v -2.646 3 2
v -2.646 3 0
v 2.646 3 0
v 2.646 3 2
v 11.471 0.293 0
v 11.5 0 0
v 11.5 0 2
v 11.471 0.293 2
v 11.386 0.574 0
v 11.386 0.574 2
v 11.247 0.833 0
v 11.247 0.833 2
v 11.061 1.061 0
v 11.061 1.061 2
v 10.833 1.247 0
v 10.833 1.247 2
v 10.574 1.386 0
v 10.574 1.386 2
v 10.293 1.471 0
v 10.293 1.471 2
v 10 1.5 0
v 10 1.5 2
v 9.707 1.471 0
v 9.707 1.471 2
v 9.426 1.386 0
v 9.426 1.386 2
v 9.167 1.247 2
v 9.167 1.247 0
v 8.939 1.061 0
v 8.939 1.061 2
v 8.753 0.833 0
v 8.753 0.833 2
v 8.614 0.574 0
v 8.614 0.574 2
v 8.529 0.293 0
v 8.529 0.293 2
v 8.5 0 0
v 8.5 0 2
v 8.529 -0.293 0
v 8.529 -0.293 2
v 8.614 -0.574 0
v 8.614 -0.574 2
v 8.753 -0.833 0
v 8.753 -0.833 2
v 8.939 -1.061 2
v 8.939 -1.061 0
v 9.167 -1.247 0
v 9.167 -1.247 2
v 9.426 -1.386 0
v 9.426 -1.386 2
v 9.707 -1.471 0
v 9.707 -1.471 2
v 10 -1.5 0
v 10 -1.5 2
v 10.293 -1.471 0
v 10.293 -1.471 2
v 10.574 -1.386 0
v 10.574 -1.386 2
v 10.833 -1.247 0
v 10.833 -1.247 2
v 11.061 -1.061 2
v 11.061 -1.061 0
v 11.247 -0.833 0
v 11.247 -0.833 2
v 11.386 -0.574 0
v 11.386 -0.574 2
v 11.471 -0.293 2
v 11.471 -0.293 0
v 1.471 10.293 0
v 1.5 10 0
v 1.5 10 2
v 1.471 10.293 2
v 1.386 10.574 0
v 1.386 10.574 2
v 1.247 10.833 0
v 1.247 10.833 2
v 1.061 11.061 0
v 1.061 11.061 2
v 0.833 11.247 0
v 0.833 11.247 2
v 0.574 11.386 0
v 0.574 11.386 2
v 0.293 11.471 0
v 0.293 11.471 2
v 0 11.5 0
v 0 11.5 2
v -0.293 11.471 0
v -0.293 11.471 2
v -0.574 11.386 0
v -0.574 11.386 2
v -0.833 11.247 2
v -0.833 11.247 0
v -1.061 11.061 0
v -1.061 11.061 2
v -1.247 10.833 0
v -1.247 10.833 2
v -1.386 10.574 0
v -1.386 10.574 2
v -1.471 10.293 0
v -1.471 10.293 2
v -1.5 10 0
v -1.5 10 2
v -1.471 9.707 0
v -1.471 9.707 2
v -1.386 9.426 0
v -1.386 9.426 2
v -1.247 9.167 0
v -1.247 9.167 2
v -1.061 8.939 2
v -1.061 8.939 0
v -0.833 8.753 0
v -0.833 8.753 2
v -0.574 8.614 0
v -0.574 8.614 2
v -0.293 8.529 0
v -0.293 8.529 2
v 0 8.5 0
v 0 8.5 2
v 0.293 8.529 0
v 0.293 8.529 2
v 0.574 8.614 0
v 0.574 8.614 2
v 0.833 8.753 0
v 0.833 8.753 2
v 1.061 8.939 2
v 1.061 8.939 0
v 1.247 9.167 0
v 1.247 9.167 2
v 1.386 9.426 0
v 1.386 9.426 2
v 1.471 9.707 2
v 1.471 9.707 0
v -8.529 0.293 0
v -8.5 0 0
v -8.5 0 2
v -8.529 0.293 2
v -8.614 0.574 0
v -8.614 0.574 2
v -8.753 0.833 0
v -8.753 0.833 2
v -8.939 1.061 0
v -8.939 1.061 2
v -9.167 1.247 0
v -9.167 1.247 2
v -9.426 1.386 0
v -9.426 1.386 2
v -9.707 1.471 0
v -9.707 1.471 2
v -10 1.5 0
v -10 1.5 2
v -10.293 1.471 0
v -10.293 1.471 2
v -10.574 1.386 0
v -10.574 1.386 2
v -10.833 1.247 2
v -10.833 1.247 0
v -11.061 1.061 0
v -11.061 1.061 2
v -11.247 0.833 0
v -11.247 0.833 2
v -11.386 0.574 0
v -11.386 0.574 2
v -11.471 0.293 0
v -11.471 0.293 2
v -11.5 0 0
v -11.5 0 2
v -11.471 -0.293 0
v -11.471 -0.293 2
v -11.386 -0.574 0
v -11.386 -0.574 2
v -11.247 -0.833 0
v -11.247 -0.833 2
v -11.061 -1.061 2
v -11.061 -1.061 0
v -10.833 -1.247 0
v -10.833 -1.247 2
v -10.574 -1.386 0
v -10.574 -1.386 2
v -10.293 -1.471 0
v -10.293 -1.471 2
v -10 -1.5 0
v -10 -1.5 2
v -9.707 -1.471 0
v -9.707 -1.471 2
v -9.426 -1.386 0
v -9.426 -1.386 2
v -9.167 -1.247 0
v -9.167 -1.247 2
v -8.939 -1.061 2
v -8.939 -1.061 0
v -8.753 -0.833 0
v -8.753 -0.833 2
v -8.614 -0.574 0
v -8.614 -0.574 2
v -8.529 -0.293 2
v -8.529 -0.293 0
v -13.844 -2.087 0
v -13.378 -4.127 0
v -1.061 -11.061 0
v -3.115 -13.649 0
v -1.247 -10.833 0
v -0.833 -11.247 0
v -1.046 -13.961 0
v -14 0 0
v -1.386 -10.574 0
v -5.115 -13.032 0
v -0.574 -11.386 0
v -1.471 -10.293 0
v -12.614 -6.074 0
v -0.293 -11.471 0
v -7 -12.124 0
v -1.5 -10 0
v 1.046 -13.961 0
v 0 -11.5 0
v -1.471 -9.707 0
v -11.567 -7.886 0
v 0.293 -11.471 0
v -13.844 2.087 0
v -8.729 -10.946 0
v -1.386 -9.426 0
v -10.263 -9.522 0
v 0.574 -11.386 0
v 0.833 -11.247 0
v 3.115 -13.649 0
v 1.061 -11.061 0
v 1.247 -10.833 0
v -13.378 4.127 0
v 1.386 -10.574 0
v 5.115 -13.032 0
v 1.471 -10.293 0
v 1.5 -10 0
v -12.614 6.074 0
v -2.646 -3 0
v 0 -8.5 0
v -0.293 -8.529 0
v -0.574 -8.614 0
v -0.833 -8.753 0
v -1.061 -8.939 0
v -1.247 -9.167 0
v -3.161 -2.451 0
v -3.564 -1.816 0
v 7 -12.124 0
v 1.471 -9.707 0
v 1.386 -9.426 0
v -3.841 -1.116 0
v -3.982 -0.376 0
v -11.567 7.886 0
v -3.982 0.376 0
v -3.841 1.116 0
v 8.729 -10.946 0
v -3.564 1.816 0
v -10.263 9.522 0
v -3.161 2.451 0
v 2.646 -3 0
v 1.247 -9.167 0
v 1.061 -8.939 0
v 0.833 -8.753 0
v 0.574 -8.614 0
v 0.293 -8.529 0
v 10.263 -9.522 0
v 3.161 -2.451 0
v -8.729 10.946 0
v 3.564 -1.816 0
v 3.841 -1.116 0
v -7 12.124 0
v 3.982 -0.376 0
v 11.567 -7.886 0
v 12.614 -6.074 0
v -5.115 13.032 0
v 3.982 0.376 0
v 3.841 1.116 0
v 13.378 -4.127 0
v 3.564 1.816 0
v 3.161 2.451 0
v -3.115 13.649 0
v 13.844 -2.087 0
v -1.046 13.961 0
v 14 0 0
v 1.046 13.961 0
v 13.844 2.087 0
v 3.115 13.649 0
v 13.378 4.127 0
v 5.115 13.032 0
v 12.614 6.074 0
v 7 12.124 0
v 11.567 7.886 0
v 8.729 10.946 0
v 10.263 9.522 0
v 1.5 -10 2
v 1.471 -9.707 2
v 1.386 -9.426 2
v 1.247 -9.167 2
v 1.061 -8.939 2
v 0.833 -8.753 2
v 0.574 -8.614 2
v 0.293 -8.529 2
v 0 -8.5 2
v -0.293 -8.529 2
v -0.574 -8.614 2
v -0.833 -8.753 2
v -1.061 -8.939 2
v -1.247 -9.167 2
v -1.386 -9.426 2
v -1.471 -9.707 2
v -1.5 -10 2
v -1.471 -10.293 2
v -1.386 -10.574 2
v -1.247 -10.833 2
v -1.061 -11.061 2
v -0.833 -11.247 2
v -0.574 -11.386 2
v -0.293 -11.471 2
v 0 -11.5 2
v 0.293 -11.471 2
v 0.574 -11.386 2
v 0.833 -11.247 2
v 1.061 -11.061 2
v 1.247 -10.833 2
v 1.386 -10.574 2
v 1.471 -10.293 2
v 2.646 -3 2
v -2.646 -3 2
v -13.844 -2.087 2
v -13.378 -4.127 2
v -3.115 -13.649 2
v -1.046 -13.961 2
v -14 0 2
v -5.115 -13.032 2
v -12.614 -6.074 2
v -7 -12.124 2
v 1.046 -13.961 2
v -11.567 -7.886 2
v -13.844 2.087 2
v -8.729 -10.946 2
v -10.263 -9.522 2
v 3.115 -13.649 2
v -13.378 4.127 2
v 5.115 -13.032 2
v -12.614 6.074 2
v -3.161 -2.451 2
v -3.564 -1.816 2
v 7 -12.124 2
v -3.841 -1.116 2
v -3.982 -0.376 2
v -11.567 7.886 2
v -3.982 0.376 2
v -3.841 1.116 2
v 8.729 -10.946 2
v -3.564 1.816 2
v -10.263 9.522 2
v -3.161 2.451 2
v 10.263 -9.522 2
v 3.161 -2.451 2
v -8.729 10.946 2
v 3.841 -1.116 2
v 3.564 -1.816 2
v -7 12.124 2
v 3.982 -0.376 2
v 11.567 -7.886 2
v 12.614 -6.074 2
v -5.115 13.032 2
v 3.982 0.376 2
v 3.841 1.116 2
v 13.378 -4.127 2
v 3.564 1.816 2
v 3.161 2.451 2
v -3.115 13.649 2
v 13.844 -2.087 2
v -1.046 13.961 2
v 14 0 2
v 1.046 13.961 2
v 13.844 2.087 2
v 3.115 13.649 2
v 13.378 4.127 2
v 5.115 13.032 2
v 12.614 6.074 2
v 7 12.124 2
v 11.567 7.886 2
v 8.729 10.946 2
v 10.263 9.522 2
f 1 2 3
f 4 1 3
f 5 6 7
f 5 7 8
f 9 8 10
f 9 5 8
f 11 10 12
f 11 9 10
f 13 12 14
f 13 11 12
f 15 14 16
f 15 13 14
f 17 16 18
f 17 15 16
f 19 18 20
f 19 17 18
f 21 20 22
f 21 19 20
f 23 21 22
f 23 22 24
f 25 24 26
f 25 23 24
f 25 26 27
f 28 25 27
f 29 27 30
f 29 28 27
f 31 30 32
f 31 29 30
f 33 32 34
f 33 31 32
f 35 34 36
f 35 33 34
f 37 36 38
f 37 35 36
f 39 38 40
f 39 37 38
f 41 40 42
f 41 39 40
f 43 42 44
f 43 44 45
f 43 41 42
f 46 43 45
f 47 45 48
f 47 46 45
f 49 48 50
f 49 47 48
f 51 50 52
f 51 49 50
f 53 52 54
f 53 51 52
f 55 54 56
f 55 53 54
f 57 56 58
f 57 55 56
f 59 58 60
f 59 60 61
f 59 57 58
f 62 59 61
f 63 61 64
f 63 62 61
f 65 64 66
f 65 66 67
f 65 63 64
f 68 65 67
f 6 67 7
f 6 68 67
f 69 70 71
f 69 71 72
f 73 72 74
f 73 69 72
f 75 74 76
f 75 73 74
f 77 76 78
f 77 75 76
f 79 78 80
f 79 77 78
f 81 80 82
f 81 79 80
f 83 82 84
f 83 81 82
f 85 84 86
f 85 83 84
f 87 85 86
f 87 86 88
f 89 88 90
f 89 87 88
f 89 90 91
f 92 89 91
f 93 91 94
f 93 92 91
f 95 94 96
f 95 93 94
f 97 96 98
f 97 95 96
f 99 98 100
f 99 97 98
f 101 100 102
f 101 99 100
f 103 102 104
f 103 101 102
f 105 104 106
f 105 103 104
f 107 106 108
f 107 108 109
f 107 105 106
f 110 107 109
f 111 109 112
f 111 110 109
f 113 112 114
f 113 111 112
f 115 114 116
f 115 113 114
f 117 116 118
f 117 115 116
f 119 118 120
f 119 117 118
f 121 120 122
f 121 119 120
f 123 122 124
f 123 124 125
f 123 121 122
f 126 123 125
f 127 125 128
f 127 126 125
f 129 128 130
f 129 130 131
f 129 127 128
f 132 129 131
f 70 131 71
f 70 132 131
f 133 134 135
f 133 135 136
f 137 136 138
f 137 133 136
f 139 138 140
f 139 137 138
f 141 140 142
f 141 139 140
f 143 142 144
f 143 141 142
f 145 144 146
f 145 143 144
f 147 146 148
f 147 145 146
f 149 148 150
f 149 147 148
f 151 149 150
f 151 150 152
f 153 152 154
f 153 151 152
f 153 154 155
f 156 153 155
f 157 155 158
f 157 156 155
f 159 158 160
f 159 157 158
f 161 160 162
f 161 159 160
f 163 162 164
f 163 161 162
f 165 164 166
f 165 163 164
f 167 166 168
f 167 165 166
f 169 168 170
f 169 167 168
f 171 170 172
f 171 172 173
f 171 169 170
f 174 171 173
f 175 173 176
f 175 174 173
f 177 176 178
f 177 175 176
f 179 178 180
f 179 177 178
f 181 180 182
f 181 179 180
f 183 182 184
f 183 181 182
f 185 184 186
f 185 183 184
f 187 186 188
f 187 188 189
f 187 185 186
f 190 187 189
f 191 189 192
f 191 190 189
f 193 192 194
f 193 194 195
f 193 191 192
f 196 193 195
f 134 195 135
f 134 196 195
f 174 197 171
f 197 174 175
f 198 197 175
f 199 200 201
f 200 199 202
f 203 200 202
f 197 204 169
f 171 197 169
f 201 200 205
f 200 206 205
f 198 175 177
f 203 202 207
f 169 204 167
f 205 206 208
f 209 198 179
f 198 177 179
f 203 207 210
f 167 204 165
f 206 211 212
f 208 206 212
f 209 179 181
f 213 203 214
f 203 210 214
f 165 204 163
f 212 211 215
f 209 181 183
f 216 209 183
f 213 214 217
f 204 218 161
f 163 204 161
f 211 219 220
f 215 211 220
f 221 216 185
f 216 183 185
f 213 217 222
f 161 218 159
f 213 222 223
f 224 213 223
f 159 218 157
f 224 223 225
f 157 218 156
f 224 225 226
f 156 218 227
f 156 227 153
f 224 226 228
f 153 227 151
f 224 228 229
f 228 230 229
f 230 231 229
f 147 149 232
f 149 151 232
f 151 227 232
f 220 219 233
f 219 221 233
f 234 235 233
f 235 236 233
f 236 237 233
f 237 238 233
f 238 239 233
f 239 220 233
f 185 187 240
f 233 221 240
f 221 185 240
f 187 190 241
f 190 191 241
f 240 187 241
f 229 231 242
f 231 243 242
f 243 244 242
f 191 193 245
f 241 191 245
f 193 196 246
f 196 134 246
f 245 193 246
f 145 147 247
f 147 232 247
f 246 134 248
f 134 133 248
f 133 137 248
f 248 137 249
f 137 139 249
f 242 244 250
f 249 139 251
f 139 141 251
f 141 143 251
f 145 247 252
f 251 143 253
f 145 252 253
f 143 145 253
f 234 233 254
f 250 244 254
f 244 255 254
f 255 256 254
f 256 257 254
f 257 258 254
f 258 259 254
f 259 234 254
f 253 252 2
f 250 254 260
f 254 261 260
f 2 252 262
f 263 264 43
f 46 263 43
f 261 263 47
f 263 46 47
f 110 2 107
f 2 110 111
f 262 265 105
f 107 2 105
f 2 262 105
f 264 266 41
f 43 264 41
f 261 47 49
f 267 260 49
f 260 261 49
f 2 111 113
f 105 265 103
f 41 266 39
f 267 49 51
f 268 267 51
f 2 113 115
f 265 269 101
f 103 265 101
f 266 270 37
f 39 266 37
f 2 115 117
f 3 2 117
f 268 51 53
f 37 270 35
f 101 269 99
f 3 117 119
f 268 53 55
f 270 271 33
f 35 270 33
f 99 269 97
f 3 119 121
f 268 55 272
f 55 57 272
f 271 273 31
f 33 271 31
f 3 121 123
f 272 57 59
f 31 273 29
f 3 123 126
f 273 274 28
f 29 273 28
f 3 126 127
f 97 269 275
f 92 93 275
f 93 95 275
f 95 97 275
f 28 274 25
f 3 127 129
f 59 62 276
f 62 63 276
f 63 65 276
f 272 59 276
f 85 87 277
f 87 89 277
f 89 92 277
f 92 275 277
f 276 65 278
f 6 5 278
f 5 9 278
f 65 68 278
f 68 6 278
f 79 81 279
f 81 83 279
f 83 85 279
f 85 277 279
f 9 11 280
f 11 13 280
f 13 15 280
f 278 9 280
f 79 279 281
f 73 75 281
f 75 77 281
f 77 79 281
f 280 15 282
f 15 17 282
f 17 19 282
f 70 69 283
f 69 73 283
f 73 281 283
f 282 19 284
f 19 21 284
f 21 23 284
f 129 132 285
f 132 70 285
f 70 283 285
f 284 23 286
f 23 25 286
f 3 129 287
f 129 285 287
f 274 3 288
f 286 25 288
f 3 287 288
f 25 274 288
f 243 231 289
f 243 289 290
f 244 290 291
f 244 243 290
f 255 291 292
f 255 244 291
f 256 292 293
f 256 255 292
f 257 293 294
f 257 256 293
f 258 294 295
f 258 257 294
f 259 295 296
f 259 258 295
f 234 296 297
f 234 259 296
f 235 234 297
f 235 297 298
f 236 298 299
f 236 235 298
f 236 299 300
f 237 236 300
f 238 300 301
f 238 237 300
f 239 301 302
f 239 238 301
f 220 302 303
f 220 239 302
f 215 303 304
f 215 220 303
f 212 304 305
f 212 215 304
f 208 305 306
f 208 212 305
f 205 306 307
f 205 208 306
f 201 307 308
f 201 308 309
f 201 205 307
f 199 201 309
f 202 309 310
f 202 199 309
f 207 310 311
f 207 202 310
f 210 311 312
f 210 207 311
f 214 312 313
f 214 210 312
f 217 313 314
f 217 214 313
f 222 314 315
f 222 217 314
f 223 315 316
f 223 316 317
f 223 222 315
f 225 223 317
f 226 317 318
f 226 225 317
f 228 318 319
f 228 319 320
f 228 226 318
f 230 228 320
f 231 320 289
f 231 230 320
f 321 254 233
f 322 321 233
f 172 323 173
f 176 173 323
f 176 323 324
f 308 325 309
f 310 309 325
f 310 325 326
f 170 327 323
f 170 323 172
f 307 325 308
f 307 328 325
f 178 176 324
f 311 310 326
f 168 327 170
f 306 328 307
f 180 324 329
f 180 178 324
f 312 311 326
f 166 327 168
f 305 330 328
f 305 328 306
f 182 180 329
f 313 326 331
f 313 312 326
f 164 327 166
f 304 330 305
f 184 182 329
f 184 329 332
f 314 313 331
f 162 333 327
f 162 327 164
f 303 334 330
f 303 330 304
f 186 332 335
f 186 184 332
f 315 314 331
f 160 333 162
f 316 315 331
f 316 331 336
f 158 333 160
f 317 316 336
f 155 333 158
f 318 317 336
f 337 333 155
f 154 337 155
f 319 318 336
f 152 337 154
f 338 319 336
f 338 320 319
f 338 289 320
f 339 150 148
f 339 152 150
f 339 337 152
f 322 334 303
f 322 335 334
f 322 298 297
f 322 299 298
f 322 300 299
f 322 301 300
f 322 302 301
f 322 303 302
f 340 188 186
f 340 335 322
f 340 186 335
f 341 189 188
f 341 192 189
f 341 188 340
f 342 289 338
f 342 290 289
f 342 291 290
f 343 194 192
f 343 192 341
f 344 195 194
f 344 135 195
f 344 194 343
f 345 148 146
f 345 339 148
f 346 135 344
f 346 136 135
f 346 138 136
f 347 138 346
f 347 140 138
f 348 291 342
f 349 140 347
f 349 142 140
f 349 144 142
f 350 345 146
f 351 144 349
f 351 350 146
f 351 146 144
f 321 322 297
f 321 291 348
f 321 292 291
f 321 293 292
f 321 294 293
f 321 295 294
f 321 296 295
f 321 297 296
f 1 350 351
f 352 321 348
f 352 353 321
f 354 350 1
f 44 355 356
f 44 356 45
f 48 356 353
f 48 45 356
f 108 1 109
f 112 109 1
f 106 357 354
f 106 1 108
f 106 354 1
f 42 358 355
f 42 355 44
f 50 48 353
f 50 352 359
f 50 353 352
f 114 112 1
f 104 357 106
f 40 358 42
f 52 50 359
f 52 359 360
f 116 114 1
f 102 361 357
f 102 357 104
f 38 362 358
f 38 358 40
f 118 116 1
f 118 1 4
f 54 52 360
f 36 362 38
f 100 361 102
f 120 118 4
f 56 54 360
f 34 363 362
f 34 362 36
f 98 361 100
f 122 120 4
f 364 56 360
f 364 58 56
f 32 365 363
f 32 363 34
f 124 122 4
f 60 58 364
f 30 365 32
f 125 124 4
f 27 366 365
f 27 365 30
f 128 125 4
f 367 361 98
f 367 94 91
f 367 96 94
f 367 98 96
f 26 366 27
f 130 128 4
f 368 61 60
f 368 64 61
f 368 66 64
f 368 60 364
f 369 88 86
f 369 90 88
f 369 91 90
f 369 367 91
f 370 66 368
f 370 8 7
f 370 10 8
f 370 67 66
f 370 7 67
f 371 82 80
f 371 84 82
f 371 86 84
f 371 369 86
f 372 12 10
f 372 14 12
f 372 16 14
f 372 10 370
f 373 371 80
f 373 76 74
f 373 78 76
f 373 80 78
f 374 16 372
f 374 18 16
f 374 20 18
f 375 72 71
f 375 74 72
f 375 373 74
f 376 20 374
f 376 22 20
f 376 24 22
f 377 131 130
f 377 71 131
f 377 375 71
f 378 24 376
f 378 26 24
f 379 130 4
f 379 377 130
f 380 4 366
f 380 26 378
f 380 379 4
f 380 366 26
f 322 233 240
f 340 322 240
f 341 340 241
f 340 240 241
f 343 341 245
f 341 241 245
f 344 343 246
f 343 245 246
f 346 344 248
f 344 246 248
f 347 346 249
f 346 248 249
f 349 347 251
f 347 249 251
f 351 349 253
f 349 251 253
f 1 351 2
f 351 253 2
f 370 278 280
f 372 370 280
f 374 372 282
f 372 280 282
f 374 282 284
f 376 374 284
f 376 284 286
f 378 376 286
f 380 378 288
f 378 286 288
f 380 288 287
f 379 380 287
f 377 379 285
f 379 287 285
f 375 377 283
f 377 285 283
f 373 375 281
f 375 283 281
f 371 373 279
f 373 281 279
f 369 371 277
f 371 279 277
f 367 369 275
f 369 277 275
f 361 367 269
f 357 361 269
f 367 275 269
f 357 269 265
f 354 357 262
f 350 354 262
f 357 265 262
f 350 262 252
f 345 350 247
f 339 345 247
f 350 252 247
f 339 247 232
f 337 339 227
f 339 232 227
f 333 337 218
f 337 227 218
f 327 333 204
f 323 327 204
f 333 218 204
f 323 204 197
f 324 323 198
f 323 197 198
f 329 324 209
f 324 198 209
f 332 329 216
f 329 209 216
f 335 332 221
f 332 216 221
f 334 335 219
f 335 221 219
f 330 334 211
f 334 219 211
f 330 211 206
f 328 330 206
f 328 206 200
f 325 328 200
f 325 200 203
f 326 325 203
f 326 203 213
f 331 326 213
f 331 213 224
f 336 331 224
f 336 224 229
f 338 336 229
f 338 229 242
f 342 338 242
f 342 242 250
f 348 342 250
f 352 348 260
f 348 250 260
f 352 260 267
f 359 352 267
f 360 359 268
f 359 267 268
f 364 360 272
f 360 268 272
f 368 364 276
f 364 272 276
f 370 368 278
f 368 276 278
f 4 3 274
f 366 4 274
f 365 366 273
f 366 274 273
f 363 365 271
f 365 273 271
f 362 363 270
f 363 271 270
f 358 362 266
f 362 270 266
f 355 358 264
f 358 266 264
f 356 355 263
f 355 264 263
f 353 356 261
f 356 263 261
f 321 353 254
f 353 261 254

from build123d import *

# Parameters (mm, degrees)
SKETCH_1_R          = 14
SKETCH_1_R_2        = 1.5
EXTRUDE_1_DEPTH     = 2
CUT_EXTRUDE_1_DEPTH = 20.899748742


with BuildPart() as part:
    # 草图1 → 凸台-拉伸1 (new body)
    with BuildSketch(Plane.XY):
        Circle(SKETCH_1_R)
        with Locations((0, 10)):
            Circle(SKETCH_1_R_2, mode=Mode.SUBTRACT)
        with Locations((10, 0)):
            Circle(SKETCH_1_R_2, mode=Mode.SUBTRACT)
        with Locations((-10, 0)):
            Circle(SKETCH_1_R_2, mode=Mode.SUBTRACT)
        with Locations((0, -10)):
            Circle(SKETCH_1_R_2, mode=Mode.SUBTRACT)
    extrude(amount=EXTRUDE_1_DEPTH)

    # 草图2 → 切除-拉伸1 (cut, through all)
    with BuildSketch(Plane(origin=(0, 0, 0), x_dir=(-1, 0, 0), z_dir=(0, 0, -1))):
        with BuildLine():
            ThreePointArc((-2.645751311, 3), (-4, 0), (-2.645751311, -3))
            Line((-2.645751311, -3), (2.645751311, -3))
            ThreePointArc((2.645751311, -3), (4, 0), (2.645751311, 3))
            Line((2.645751311, 3), (-2.645751311, 3))
        make_face()
    extrude(amount=-CUT_EXTRUDE_1_DEPTH, mode=Mode.SUBTRACT)


solid = part.part
